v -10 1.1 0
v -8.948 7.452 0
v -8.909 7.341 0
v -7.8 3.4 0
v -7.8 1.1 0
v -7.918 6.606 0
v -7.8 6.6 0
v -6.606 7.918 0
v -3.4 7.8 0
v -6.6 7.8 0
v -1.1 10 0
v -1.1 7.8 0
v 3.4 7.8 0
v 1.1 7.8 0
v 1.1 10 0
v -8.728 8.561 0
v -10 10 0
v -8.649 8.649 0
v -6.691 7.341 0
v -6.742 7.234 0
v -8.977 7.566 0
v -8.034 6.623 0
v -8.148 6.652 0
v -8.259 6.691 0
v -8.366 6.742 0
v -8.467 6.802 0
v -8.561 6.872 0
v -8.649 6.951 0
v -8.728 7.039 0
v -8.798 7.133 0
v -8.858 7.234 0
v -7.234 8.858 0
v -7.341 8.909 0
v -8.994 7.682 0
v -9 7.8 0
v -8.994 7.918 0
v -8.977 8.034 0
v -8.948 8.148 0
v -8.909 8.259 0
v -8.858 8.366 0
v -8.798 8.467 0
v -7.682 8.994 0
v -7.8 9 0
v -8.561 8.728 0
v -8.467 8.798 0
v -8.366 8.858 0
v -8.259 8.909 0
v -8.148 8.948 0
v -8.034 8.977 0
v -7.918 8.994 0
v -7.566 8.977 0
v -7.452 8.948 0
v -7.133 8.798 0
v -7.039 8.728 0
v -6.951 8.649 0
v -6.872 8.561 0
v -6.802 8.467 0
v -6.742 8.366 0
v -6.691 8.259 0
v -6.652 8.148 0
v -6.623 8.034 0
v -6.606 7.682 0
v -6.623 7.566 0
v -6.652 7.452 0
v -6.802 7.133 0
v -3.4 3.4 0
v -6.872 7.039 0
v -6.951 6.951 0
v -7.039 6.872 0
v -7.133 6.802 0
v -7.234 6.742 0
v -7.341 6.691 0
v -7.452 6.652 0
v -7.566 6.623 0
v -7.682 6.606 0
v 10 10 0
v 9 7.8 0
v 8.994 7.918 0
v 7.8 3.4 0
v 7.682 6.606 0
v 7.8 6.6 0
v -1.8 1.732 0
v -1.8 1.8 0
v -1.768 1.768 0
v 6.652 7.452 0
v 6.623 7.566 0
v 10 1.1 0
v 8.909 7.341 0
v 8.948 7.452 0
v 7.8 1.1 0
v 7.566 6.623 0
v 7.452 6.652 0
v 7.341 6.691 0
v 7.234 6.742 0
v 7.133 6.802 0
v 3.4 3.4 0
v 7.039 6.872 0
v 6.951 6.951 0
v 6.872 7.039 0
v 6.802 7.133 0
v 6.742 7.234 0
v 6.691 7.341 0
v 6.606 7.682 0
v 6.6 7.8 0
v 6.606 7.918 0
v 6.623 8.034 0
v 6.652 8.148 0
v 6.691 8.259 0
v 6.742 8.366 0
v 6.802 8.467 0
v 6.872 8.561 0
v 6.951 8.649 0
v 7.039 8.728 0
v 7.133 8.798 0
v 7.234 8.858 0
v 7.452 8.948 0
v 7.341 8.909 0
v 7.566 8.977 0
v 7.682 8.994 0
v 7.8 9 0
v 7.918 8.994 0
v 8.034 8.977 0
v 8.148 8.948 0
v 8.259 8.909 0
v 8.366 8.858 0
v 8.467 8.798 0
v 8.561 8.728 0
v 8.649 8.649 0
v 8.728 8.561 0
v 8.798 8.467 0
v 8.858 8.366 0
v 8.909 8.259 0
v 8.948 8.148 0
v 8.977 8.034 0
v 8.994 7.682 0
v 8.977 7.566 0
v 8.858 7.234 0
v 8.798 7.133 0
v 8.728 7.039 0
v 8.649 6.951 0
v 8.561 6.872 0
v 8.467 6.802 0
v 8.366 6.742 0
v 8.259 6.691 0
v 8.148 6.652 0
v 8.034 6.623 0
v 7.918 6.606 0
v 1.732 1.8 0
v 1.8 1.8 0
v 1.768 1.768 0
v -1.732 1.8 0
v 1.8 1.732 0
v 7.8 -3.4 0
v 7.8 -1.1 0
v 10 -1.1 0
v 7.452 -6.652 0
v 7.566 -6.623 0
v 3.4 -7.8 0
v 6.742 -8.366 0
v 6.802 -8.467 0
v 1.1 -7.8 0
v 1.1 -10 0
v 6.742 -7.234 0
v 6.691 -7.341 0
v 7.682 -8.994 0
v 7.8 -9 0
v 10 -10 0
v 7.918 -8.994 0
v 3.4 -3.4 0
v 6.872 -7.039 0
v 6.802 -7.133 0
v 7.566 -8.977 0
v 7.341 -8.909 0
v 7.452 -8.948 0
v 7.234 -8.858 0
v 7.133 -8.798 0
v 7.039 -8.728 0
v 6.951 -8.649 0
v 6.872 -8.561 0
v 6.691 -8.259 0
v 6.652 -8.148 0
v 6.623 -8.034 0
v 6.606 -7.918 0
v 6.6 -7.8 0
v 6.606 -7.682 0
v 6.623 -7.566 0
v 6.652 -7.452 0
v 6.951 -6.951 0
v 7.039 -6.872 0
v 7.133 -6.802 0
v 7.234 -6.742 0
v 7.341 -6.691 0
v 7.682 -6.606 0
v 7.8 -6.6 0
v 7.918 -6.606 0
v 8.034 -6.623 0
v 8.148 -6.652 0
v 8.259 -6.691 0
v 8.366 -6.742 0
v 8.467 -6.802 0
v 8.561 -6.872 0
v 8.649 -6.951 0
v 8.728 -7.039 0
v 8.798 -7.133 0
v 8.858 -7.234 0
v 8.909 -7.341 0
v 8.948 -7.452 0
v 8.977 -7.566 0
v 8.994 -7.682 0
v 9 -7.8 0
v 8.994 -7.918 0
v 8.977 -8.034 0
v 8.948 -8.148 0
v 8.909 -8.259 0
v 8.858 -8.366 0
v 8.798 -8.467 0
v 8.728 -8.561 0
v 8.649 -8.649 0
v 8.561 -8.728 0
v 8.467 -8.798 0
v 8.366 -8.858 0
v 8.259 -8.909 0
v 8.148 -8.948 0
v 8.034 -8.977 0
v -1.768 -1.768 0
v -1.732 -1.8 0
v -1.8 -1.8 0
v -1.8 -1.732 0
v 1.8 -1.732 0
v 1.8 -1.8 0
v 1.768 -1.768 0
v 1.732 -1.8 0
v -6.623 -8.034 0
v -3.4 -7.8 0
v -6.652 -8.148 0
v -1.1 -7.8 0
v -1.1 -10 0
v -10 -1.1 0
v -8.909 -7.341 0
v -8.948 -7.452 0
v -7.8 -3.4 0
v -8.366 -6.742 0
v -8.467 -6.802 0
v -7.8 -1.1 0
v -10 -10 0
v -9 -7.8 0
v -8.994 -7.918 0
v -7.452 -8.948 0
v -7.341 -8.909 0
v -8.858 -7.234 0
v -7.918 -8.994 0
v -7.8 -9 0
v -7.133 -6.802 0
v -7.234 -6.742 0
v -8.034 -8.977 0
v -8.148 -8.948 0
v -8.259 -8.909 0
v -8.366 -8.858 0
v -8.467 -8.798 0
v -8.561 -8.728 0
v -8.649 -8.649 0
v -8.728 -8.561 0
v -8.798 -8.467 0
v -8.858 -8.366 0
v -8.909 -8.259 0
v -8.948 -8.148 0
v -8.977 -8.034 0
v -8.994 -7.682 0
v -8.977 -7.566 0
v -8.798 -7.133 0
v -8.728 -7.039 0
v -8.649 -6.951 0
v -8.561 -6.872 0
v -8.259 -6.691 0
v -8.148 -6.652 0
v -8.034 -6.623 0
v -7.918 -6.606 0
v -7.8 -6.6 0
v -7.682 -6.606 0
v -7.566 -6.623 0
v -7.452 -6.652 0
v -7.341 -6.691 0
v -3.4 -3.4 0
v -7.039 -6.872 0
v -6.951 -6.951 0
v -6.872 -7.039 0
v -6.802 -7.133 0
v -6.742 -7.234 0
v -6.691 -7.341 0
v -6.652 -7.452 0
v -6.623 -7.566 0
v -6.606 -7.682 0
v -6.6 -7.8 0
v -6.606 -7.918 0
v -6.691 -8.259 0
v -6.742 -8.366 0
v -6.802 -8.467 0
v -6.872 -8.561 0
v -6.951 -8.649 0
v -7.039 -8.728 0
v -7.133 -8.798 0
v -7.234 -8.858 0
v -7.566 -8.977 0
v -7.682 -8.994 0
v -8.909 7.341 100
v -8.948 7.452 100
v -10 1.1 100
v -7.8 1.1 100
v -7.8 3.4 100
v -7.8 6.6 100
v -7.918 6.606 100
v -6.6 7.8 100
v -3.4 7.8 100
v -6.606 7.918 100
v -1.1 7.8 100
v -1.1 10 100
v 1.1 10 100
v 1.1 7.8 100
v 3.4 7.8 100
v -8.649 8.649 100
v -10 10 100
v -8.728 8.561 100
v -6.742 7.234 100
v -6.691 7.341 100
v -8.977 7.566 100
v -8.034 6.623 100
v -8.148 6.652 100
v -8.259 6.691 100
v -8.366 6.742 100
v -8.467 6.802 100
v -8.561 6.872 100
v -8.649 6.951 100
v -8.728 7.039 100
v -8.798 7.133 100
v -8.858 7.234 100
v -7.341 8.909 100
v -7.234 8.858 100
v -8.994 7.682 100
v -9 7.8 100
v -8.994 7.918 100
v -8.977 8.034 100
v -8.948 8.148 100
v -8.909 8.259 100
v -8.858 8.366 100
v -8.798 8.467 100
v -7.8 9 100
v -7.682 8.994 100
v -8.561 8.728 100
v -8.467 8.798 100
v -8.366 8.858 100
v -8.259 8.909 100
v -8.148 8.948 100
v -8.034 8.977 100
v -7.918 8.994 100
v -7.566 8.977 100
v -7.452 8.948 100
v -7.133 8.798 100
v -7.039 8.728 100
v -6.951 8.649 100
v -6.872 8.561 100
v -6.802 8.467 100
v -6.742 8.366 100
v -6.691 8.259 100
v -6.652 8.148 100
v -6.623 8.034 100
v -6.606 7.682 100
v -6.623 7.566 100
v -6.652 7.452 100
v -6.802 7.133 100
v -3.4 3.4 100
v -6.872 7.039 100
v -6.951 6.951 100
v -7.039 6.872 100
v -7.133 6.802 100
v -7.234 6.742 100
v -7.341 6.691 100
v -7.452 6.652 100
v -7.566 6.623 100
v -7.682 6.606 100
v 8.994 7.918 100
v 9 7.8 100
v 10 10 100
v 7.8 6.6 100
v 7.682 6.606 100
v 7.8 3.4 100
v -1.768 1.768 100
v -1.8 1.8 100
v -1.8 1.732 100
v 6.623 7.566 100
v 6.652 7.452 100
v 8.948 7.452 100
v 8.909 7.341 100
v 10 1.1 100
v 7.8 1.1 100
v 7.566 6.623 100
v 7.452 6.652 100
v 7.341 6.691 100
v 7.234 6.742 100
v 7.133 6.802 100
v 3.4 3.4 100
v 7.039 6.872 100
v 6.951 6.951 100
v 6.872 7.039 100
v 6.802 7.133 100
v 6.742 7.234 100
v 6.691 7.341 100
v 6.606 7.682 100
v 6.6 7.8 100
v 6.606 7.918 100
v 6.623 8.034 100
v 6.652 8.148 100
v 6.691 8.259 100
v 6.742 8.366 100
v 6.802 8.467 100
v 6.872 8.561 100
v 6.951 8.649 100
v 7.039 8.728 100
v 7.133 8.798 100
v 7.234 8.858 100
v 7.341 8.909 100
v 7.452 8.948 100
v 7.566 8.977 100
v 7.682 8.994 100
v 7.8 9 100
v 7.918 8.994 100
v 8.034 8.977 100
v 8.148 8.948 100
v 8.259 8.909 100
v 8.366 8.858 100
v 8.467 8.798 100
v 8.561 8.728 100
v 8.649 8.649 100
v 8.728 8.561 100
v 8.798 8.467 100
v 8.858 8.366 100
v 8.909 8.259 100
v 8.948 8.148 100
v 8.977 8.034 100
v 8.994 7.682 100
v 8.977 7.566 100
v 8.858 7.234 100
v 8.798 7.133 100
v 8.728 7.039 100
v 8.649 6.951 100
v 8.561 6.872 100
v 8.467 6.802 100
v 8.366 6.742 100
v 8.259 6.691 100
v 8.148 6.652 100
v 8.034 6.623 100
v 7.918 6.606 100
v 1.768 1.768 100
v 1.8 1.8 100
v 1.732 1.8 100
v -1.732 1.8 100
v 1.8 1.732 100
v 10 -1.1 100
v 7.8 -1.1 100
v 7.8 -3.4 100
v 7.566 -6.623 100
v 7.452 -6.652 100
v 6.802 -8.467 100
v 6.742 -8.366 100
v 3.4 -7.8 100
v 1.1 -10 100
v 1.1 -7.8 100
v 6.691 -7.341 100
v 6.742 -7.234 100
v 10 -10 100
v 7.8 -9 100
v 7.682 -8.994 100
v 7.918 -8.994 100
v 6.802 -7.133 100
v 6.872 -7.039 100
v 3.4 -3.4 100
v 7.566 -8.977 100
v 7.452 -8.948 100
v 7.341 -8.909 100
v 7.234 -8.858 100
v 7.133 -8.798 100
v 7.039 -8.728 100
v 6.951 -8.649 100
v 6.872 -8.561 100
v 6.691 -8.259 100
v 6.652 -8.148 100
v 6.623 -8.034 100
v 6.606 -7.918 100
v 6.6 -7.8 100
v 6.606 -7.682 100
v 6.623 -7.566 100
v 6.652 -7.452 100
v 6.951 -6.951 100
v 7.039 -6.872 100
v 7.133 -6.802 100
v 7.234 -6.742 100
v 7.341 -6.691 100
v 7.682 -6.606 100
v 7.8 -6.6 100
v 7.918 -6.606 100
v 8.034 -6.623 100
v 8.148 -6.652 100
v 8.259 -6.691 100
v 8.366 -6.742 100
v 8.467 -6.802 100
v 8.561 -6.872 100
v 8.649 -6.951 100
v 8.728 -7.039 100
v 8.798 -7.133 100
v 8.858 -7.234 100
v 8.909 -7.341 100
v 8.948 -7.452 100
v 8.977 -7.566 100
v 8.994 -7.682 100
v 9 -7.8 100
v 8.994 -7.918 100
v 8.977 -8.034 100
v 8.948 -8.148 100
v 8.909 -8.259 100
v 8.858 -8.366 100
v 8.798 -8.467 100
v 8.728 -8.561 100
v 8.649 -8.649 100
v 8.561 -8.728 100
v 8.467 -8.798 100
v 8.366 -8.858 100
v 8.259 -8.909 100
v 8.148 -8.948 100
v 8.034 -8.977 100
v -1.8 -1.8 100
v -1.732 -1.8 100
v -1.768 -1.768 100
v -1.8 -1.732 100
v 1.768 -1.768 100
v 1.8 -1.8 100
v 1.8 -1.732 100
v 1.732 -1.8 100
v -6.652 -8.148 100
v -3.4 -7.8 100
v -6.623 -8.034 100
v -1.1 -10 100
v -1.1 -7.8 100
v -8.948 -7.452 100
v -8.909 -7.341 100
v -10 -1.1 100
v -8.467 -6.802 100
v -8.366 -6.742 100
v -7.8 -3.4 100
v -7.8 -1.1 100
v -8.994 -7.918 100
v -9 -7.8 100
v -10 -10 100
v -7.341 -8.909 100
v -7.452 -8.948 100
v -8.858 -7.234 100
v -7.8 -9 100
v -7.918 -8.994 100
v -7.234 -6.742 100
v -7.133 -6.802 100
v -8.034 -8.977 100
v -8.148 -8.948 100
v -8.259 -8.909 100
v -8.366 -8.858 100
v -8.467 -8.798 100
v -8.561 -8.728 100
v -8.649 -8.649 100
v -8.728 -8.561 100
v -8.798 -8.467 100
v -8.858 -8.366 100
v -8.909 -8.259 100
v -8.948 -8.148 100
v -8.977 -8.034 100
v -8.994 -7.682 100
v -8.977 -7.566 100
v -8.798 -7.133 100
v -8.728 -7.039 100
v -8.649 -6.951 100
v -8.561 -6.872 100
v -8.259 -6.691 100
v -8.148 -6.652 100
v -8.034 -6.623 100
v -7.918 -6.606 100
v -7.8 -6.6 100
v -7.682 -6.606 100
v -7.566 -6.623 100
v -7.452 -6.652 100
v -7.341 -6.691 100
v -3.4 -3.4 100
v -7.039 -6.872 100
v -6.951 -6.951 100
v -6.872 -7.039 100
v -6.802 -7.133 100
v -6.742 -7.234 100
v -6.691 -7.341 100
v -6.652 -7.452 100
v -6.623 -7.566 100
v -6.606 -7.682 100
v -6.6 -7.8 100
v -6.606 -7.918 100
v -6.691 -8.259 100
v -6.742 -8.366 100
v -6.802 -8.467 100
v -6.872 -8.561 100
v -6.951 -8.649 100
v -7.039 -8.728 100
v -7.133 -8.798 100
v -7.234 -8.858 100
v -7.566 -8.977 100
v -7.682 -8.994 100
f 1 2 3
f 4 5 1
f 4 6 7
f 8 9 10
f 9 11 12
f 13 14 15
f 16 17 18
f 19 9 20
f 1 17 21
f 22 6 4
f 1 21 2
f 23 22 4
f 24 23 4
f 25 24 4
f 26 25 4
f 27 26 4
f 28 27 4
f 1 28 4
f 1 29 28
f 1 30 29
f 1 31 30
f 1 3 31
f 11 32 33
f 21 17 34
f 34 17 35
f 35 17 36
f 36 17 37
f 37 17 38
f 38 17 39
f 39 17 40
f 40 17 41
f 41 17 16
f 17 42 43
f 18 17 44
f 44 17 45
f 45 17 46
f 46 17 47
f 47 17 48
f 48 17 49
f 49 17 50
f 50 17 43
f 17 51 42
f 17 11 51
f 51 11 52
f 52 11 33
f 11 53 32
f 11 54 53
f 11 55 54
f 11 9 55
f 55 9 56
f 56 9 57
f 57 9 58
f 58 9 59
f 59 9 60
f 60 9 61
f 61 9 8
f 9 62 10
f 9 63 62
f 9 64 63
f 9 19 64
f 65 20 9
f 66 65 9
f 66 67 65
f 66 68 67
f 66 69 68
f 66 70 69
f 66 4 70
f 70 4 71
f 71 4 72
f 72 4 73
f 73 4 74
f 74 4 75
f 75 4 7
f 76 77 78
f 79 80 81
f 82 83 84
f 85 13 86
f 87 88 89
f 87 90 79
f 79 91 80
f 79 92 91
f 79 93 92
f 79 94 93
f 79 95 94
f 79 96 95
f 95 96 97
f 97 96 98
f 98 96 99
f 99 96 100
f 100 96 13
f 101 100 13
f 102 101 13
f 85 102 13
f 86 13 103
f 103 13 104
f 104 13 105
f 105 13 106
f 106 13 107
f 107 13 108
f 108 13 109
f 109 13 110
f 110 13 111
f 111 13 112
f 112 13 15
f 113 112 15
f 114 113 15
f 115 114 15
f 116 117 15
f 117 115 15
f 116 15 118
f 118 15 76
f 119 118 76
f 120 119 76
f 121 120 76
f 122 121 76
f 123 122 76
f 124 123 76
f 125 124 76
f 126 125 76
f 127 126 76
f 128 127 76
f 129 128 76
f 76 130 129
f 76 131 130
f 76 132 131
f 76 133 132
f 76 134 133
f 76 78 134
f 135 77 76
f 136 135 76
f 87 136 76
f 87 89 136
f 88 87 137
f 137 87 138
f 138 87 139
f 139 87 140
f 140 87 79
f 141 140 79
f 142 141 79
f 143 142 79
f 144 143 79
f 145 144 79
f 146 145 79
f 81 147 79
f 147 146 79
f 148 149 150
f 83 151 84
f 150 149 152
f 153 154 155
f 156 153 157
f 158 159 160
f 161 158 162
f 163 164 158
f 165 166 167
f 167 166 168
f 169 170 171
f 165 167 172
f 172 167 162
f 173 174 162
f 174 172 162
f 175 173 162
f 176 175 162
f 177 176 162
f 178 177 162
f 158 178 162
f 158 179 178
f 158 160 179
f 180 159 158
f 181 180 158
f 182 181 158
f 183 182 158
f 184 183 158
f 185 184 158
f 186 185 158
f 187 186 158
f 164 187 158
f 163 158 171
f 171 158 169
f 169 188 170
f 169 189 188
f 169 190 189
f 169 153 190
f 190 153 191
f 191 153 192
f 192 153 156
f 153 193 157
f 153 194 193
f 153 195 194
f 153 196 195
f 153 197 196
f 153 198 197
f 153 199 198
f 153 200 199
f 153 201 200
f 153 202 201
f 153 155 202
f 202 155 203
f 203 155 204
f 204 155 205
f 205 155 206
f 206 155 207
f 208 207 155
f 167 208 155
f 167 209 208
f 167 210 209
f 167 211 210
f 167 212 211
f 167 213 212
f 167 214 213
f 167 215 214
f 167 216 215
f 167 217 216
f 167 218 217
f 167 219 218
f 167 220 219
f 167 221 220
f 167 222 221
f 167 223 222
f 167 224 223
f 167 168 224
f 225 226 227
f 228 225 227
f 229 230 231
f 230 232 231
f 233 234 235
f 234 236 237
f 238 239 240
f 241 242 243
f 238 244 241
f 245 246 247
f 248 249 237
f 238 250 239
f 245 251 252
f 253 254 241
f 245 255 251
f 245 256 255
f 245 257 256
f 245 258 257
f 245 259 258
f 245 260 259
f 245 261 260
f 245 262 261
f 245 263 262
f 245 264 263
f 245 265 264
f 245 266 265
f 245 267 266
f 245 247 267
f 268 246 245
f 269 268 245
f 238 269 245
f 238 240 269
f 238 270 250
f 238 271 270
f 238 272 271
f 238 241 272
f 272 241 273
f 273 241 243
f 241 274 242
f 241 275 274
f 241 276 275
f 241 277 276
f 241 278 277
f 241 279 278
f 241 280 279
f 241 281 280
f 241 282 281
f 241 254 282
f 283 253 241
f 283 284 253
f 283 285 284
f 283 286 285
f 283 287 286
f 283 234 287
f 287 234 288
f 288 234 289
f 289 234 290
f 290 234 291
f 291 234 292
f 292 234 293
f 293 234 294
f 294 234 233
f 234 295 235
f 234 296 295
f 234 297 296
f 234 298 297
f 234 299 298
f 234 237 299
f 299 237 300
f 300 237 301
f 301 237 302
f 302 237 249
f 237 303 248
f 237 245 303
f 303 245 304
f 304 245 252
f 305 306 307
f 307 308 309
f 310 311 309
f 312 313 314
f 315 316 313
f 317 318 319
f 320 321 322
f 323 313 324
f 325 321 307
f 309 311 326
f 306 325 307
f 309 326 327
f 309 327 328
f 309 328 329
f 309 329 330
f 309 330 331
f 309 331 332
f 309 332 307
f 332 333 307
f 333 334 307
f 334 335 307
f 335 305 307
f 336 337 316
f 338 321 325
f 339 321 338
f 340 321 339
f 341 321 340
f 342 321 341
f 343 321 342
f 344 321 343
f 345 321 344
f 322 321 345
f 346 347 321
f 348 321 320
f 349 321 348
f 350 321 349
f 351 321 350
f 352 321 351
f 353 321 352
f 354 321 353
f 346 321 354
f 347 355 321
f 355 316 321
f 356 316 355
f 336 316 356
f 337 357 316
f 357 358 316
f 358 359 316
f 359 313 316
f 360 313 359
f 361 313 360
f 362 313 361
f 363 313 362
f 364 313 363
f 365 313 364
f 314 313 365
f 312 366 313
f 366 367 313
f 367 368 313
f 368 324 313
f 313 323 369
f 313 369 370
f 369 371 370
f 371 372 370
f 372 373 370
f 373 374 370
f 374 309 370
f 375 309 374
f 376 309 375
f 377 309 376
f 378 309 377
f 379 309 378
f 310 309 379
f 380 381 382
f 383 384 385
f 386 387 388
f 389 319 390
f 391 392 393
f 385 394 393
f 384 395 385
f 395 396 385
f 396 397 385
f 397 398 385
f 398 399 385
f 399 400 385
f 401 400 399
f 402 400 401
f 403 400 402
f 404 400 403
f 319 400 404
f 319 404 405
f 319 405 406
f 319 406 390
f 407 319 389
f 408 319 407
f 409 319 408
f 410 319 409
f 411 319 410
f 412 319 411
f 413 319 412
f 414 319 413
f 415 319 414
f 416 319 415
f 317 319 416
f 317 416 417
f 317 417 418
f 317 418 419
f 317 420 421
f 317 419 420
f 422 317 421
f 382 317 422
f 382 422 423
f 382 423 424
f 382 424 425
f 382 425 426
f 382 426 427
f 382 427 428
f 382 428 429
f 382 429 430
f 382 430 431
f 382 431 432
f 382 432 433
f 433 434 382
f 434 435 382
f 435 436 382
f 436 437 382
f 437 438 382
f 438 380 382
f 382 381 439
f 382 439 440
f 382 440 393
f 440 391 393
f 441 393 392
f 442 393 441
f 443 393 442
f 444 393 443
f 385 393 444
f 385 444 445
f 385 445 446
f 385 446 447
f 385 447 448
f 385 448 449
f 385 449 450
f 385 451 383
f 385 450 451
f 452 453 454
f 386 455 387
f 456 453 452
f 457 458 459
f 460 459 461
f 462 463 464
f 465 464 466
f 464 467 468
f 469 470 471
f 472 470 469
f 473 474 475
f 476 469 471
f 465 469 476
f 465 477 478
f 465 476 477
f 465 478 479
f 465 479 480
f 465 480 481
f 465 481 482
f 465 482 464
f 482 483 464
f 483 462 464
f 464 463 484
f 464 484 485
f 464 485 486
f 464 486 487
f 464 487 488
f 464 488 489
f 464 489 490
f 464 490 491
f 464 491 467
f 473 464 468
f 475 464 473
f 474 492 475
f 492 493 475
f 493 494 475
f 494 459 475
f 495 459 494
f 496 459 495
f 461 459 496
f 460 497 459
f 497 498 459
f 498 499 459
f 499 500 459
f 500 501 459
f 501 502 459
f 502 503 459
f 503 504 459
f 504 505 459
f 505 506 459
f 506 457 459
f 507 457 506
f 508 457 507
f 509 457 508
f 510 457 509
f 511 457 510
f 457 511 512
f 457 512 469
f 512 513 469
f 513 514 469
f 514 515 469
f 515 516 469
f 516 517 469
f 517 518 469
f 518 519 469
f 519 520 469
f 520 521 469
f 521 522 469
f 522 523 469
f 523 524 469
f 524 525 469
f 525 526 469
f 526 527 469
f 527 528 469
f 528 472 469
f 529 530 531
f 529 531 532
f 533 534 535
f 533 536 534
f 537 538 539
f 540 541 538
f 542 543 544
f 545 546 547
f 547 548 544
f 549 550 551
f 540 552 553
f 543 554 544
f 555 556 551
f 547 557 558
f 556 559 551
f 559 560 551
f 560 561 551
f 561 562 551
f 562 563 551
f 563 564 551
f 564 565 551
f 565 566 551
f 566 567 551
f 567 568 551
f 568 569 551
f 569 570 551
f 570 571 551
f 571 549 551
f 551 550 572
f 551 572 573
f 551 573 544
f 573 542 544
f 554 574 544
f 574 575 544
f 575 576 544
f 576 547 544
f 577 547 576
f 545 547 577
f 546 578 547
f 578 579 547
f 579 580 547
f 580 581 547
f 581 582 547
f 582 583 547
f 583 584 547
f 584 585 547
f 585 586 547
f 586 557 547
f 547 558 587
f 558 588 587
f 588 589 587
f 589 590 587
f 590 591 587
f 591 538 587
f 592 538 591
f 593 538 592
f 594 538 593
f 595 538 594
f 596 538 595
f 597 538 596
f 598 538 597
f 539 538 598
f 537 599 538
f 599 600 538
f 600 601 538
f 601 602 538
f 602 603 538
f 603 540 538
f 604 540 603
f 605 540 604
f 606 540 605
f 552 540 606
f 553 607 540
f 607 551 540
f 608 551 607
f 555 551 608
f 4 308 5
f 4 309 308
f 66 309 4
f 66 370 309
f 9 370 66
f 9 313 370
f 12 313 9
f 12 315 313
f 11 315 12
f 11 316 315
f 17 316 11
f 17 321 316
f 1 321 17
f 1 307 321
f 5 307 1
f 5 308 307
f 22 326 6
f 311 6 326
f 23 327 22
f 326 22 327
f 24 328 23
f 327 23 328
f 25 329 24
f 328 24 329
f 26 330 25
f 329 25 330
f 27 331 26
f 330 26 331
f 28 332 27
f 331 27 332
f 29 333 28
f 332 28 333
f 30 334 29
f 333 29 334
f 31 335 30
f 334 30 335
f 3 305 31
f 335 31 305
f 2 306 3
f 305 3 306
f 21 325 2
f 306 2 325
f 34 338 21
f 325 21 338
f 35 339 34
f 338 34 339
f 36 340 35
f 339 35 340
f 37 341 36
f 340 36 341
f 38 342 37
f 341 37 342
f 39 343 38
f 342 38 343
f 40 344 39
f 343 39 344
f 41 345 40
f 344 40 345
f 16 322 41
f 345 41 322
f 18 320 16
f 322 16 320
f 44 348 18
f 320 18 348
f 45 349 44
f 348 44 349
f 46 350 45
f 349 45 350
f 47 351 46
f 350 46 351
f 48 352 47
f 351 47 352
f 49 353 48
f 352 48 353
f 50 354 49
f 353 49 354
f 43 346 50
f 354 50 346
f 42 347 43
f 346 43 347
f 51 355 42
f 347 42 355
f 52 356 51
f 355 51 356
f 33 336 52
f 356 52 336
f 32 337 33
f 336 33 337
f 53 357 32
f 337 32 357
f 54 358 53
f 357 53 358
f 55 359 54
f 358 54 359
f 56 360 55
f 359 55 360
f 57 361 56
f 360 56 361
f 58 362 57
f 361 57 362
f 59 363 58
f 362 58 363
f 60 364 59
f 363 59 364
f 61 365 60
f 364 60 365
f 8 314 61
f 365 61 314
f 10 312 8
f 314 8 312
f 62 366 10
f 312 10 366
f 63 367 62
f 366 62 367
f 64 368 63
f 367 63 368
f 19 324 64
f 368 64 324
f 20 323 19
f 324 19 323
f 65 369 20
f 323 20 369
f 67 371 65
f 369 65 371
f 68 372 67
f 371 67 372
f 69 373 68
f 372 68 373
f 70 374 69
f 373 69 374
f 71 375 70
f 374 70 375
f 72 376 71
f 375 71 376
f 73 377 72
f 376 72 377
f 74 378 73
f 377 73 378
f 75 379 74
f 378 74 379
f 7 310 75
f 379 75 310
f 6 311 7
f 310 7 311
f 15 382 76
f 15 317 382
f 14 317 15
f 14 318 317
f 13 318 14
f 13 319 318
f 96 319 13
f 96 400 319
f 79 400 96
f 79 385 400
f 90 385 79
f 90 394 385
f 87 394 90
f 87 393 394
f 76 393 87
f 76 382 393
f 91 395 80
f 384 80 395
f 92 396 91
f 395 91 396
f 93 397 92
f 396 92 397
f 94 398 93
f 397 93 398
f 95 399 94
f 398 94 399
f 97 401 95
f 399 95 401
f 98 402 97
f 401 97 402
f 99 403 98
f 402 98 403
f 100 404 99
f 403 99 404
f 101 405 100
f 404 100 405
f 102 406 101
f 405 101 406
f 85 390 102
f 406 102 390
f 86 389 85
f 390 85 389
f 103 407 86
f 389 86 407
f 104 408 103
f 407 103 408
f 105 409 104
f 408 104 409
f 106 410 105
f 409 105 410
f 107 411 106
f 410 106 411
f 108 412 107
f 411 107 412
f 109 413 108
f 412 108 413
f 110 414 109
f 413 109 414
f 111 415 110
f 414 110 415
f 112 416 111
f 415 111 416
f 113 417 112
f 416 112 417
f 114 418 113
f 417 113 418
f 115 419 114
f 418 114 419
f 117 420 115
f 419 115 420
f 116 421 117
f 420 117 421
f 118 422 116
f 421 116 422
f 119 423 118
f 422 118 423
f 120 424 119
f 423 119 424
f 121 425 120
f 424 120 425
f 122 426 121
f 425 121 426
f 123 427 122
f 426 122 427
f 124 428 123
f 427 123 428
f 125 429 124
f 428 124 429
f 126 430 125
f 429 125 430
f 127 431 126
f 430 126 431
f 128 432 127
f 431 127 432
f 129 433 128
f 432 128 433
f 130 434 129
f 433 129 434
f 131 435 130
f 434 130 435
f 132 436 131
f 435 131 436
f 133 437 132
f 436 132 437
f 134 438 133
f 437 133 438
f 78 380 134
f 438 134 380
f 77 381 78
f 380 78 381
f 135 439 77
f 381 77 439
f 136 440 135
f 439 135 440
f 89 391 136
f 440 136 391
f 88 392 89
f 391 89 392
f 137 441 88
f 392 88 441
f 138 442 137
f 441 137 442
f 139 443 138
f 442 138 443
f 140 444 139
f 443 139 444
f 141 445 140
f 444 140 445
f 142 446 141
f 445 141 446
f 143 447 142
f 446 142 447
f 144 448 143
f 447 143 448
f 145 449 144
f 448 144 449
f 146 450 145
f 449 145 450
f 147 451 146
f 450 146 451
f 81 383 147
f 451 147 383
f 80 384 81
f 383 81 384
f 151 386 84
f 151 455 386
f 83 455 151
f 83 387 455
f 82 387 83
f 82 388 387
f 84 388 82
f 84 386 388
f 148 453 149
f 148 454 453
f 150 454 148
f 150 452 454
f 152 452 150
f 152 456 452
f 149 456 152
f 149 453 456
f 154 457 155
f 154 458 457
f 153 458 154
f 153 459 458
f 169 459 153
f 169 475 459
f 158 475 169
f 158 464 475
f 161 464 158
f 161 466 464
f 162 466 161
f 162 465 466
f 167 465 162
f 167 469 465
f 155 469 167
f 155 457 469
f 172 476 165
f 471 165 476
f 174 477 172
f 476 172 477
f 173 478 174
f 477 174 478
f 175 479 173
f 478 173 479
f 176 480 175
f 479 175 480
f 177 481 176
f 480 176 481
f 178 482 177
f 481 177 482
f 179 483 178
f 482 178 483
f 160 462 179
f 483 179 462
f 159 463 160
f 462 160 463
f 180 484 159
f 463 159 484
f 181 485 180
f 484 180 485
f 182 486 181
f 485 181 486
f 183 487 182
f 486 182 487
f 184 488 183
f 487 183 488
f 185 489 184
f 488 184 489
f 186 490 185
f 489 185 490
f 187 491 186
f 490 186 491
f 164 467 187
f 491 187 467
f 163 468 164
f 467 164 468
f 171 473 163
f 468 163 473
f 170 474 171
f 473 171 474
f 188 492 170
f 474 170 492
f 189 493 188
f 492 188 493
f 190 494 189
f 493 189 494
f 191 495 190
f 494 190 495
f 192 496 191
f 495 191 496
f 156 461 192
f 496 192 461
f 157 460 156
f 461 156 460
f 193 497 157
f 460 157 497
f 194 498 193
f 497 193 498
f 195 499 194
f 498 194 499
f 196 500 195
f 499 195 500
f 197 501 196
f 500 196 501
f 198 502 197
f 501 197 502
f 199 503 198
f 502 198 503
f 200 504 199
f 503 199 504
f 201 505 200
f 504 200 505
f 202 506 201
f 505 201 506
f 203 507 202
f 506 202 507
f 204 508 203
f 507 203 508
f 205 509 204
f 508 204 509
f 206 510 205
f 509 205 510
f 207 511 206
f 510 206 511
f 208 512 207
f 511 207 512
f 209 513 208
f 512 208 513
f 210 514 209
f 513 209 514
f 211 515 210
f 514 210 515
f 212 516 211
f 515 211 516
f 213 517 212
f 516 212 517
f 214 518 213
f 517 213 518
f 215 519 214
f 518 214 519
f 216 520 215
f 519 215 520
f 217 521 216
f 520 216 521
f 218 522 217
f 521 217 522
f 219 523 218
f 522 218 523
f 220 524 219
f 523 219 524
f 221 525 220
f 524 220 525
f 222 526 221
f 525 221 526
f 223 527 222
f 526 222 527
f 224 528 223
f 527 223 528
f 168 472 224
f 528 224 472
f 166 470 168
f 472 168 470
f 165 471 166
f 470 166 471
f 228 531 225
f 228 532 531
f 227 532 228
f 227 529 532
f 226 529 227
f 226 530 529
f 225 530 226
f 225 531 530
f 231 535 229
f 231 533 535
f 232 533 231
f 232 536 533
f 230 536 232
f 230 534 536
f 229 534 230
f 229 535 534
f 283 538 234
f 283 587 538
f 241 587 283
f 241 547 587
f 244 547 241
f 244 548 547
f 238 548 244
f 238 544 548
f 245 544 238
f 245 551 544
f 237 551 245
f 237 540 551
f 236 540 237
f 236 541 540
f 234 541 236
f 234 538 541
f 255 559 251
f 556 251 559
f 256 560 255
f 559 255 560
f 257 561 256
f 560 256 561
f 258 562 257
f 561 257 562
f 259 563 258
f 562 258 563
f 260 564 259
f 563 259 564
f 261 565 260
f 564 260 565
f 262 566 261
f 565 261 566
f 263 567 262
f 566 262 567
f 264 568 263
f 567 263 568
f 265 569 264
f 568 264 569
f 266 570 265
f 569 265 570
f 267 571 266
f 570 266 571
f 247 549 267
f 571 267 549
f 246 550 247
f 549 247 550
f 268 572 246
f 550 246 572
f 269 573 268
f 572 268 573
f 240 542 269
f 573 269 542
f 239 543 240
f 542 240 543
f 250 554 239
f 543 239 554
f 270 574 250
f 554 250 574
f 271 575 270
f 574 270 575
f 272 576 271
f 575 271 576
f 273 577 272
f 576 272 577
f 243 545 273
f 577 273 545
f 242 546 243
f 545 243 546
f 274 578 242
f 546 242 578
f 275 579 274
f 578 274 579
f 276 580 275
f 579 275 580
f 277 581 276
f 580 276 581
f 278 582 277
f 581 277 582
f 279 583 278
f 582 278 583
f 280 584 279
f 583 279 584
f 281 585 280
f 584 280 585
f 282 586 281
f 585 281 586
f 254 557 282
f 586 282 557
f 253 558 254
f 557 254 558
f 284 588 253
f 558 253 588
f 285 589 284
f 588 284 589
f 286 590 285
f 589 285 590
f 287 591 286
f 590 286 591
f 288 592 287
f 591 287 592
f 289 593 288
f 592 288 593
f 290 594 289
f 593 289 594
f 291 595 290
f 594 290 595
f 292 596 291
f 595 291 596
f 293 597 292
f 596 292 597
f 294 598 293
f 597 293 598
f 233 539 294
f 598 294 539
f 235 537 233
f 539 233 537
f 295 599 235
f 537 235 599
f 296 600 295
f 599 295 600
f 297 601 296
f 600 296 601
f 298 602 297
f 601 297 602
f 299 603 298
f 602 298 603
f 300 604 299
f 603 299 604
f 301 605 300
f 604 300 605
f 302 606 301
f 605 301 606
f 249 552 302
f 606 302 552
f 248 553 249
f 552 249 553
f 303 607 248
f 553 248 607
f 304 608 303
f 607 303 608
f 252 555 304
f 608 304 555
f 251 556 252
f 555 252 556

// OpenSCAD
$fn = 64;

// Parameters
size = 20.0;      // mm (square cross-section)
length = 100.0;   // mm

// Simple 20x20 aluminum extrusion-like profile (outer square with central bore and 4 T-slots)
module extrusion2020_profile() {
    difference() {
        // Outer body
        square([size, size], center = true);

        // Central bore
        circle(d = 5.0);

        // Four T-slots (approximation)
        for (a = [0, 90, 180, 270]) {
            rotate(a) translate([size/2 - 3.0, 0]) {
                // Slot opening at the face
                square([6.0, 2.2], center = true);
                // Inner cavity of the slot
                translate([-2.2, 0]) square([6.0, 6.8], center = true);
            }
        }

        // Corner reliefs (approximation of rounded/relieved corners)
        for (sx = [-1, 1], sy = [-1, 1]) {
            translate([sx*(size/2 - 2.2), sy*(size/2 - 2.2)])
                circle(r = 1.2);
        }
    }
}

linear_extrude(height = length, center = false, convexity = 10)
    extrusion2020_profile();
